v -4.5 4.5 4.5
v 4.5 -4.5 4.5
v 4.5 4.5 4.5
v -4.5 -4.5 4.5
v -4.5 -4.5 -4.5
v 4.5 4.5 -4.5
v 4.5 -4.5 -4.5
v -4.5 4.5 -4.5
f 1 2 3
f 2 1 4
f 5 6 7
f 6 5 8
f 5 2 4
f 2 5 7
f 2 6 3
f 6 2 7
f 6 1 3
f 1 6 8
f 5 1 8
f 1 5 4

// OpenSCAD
// Generated by Mecha (https://github.com/tomahawkins/mecha)

color([0.5, 0.5, 0.5, 1.0]) translate ([-4.5, -4.5, -4.5]) cube(size = [9.0, 9.0, 9.0], center = false);
